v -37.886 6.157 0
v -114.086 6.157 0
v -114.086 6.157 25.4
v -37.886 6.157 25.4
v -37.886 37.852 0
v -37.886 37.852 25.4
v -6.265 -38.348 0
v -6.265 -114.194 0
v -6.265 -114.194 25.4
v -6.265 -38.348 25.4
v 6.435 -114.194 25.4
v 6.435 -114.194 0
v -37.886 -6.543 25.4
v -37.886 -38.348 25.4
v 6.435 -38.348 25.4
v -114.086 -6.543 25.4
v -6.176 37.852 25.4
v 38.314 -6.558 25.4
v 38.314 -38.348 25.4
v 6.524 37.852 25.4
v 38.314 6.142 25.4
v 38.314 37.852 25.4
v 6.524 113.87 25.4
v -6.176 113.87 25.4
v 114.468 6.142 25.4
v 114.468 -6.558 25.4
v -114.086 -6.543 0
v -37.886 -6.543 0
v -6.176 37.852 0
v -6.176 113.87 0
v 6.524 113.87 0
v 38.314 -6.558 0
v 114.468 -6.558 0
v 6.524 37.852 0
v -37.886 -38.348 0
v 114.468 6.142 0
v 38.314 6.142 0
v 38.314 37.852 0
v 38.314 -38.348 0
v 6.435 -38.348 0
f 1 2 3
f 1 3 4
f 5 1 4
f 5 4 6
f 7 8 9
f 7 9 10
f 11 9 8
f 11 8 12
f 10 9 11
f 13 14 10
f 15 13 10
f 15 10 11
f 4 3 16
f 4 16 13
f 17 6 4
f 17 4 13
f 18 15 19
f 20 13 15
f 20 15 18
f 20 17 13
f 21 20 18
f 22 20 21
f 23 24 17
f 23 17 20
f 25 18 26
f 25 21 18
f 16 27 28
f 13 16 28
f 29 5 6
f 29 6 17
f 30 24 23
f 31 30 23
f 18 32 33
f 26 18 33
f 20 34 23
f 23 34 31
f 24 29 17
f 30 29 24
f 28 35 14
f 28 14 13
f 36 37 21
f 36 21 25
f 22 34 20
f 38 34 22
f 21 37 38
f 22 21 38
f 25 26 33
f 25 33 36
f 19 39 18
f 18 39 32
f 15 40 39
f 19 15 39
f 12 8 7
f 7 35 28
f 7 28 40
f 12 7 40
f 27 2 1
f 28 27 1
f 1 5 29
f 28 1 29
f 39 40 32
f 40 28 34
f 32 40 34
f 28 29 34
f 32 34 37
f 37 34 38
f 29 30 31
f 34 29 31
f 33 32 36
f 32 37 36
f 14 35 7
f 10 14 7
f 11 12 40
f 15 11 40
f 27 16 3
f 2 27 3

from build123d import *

# Parameters (mm, degrees)
F0_W     = 76.2
F0_H     = 76.2
F1_DEPTH = 25.4
F2_W     = 12.7
F2_H     = 76.2
F6_DEPTH = 25.4
F4_W     = 76.2
F4_H     = 12.7
F7_DEPTH = 25.4
F5_W     = 76.2
F5_H     = 12.7
F8_DEPTH = 25.4
F3_W     = 12.7
F3_H     = 76.2
F9_DEPTH = 25.4


with BuildPart() as f1:
    # F0 (on Top) → F1 (new body)
    with BuildSketch(Plane.XY):
        with Locations((0.213519, -0.247781)):
            Rectangle(F0_W, F0_H)
    extrude(amount=F1_DEPTH)

    # F2 (on Top) → F6 (join)
    with BuildSketch(Plane.XY):
        with Locations((0.173656, 75.769984)):
            Rectangle(F2_W, F2_H)
    extrude(amount=F6_DEPTH)

    # F4 (on Top) → F7 (join)
    with BuildSketch(Plane.XY):
        with Locations((-75.986146, -0.193442)):
            Rectangle(F4_W, F4_H)
    extrude(amount=F7_DEPTH)

    # F5 (on Top) → F8 (join)
    with BuildSketch(Plane.XY):
        with Locations((76.36796, -0.207913)):
            Rectangle(F5_W, F5_H)
    extrude(amount=F8_DEPTH)

    # F3 (on Top) → F9 (join)
    with BuildSketch(Plane.XY):
        with Locations((0.085362, -76.094228)):
            Rectangle(F3_W, F3_H)
    extrude(amount=F9_DEPTH)


solid = f1.part
